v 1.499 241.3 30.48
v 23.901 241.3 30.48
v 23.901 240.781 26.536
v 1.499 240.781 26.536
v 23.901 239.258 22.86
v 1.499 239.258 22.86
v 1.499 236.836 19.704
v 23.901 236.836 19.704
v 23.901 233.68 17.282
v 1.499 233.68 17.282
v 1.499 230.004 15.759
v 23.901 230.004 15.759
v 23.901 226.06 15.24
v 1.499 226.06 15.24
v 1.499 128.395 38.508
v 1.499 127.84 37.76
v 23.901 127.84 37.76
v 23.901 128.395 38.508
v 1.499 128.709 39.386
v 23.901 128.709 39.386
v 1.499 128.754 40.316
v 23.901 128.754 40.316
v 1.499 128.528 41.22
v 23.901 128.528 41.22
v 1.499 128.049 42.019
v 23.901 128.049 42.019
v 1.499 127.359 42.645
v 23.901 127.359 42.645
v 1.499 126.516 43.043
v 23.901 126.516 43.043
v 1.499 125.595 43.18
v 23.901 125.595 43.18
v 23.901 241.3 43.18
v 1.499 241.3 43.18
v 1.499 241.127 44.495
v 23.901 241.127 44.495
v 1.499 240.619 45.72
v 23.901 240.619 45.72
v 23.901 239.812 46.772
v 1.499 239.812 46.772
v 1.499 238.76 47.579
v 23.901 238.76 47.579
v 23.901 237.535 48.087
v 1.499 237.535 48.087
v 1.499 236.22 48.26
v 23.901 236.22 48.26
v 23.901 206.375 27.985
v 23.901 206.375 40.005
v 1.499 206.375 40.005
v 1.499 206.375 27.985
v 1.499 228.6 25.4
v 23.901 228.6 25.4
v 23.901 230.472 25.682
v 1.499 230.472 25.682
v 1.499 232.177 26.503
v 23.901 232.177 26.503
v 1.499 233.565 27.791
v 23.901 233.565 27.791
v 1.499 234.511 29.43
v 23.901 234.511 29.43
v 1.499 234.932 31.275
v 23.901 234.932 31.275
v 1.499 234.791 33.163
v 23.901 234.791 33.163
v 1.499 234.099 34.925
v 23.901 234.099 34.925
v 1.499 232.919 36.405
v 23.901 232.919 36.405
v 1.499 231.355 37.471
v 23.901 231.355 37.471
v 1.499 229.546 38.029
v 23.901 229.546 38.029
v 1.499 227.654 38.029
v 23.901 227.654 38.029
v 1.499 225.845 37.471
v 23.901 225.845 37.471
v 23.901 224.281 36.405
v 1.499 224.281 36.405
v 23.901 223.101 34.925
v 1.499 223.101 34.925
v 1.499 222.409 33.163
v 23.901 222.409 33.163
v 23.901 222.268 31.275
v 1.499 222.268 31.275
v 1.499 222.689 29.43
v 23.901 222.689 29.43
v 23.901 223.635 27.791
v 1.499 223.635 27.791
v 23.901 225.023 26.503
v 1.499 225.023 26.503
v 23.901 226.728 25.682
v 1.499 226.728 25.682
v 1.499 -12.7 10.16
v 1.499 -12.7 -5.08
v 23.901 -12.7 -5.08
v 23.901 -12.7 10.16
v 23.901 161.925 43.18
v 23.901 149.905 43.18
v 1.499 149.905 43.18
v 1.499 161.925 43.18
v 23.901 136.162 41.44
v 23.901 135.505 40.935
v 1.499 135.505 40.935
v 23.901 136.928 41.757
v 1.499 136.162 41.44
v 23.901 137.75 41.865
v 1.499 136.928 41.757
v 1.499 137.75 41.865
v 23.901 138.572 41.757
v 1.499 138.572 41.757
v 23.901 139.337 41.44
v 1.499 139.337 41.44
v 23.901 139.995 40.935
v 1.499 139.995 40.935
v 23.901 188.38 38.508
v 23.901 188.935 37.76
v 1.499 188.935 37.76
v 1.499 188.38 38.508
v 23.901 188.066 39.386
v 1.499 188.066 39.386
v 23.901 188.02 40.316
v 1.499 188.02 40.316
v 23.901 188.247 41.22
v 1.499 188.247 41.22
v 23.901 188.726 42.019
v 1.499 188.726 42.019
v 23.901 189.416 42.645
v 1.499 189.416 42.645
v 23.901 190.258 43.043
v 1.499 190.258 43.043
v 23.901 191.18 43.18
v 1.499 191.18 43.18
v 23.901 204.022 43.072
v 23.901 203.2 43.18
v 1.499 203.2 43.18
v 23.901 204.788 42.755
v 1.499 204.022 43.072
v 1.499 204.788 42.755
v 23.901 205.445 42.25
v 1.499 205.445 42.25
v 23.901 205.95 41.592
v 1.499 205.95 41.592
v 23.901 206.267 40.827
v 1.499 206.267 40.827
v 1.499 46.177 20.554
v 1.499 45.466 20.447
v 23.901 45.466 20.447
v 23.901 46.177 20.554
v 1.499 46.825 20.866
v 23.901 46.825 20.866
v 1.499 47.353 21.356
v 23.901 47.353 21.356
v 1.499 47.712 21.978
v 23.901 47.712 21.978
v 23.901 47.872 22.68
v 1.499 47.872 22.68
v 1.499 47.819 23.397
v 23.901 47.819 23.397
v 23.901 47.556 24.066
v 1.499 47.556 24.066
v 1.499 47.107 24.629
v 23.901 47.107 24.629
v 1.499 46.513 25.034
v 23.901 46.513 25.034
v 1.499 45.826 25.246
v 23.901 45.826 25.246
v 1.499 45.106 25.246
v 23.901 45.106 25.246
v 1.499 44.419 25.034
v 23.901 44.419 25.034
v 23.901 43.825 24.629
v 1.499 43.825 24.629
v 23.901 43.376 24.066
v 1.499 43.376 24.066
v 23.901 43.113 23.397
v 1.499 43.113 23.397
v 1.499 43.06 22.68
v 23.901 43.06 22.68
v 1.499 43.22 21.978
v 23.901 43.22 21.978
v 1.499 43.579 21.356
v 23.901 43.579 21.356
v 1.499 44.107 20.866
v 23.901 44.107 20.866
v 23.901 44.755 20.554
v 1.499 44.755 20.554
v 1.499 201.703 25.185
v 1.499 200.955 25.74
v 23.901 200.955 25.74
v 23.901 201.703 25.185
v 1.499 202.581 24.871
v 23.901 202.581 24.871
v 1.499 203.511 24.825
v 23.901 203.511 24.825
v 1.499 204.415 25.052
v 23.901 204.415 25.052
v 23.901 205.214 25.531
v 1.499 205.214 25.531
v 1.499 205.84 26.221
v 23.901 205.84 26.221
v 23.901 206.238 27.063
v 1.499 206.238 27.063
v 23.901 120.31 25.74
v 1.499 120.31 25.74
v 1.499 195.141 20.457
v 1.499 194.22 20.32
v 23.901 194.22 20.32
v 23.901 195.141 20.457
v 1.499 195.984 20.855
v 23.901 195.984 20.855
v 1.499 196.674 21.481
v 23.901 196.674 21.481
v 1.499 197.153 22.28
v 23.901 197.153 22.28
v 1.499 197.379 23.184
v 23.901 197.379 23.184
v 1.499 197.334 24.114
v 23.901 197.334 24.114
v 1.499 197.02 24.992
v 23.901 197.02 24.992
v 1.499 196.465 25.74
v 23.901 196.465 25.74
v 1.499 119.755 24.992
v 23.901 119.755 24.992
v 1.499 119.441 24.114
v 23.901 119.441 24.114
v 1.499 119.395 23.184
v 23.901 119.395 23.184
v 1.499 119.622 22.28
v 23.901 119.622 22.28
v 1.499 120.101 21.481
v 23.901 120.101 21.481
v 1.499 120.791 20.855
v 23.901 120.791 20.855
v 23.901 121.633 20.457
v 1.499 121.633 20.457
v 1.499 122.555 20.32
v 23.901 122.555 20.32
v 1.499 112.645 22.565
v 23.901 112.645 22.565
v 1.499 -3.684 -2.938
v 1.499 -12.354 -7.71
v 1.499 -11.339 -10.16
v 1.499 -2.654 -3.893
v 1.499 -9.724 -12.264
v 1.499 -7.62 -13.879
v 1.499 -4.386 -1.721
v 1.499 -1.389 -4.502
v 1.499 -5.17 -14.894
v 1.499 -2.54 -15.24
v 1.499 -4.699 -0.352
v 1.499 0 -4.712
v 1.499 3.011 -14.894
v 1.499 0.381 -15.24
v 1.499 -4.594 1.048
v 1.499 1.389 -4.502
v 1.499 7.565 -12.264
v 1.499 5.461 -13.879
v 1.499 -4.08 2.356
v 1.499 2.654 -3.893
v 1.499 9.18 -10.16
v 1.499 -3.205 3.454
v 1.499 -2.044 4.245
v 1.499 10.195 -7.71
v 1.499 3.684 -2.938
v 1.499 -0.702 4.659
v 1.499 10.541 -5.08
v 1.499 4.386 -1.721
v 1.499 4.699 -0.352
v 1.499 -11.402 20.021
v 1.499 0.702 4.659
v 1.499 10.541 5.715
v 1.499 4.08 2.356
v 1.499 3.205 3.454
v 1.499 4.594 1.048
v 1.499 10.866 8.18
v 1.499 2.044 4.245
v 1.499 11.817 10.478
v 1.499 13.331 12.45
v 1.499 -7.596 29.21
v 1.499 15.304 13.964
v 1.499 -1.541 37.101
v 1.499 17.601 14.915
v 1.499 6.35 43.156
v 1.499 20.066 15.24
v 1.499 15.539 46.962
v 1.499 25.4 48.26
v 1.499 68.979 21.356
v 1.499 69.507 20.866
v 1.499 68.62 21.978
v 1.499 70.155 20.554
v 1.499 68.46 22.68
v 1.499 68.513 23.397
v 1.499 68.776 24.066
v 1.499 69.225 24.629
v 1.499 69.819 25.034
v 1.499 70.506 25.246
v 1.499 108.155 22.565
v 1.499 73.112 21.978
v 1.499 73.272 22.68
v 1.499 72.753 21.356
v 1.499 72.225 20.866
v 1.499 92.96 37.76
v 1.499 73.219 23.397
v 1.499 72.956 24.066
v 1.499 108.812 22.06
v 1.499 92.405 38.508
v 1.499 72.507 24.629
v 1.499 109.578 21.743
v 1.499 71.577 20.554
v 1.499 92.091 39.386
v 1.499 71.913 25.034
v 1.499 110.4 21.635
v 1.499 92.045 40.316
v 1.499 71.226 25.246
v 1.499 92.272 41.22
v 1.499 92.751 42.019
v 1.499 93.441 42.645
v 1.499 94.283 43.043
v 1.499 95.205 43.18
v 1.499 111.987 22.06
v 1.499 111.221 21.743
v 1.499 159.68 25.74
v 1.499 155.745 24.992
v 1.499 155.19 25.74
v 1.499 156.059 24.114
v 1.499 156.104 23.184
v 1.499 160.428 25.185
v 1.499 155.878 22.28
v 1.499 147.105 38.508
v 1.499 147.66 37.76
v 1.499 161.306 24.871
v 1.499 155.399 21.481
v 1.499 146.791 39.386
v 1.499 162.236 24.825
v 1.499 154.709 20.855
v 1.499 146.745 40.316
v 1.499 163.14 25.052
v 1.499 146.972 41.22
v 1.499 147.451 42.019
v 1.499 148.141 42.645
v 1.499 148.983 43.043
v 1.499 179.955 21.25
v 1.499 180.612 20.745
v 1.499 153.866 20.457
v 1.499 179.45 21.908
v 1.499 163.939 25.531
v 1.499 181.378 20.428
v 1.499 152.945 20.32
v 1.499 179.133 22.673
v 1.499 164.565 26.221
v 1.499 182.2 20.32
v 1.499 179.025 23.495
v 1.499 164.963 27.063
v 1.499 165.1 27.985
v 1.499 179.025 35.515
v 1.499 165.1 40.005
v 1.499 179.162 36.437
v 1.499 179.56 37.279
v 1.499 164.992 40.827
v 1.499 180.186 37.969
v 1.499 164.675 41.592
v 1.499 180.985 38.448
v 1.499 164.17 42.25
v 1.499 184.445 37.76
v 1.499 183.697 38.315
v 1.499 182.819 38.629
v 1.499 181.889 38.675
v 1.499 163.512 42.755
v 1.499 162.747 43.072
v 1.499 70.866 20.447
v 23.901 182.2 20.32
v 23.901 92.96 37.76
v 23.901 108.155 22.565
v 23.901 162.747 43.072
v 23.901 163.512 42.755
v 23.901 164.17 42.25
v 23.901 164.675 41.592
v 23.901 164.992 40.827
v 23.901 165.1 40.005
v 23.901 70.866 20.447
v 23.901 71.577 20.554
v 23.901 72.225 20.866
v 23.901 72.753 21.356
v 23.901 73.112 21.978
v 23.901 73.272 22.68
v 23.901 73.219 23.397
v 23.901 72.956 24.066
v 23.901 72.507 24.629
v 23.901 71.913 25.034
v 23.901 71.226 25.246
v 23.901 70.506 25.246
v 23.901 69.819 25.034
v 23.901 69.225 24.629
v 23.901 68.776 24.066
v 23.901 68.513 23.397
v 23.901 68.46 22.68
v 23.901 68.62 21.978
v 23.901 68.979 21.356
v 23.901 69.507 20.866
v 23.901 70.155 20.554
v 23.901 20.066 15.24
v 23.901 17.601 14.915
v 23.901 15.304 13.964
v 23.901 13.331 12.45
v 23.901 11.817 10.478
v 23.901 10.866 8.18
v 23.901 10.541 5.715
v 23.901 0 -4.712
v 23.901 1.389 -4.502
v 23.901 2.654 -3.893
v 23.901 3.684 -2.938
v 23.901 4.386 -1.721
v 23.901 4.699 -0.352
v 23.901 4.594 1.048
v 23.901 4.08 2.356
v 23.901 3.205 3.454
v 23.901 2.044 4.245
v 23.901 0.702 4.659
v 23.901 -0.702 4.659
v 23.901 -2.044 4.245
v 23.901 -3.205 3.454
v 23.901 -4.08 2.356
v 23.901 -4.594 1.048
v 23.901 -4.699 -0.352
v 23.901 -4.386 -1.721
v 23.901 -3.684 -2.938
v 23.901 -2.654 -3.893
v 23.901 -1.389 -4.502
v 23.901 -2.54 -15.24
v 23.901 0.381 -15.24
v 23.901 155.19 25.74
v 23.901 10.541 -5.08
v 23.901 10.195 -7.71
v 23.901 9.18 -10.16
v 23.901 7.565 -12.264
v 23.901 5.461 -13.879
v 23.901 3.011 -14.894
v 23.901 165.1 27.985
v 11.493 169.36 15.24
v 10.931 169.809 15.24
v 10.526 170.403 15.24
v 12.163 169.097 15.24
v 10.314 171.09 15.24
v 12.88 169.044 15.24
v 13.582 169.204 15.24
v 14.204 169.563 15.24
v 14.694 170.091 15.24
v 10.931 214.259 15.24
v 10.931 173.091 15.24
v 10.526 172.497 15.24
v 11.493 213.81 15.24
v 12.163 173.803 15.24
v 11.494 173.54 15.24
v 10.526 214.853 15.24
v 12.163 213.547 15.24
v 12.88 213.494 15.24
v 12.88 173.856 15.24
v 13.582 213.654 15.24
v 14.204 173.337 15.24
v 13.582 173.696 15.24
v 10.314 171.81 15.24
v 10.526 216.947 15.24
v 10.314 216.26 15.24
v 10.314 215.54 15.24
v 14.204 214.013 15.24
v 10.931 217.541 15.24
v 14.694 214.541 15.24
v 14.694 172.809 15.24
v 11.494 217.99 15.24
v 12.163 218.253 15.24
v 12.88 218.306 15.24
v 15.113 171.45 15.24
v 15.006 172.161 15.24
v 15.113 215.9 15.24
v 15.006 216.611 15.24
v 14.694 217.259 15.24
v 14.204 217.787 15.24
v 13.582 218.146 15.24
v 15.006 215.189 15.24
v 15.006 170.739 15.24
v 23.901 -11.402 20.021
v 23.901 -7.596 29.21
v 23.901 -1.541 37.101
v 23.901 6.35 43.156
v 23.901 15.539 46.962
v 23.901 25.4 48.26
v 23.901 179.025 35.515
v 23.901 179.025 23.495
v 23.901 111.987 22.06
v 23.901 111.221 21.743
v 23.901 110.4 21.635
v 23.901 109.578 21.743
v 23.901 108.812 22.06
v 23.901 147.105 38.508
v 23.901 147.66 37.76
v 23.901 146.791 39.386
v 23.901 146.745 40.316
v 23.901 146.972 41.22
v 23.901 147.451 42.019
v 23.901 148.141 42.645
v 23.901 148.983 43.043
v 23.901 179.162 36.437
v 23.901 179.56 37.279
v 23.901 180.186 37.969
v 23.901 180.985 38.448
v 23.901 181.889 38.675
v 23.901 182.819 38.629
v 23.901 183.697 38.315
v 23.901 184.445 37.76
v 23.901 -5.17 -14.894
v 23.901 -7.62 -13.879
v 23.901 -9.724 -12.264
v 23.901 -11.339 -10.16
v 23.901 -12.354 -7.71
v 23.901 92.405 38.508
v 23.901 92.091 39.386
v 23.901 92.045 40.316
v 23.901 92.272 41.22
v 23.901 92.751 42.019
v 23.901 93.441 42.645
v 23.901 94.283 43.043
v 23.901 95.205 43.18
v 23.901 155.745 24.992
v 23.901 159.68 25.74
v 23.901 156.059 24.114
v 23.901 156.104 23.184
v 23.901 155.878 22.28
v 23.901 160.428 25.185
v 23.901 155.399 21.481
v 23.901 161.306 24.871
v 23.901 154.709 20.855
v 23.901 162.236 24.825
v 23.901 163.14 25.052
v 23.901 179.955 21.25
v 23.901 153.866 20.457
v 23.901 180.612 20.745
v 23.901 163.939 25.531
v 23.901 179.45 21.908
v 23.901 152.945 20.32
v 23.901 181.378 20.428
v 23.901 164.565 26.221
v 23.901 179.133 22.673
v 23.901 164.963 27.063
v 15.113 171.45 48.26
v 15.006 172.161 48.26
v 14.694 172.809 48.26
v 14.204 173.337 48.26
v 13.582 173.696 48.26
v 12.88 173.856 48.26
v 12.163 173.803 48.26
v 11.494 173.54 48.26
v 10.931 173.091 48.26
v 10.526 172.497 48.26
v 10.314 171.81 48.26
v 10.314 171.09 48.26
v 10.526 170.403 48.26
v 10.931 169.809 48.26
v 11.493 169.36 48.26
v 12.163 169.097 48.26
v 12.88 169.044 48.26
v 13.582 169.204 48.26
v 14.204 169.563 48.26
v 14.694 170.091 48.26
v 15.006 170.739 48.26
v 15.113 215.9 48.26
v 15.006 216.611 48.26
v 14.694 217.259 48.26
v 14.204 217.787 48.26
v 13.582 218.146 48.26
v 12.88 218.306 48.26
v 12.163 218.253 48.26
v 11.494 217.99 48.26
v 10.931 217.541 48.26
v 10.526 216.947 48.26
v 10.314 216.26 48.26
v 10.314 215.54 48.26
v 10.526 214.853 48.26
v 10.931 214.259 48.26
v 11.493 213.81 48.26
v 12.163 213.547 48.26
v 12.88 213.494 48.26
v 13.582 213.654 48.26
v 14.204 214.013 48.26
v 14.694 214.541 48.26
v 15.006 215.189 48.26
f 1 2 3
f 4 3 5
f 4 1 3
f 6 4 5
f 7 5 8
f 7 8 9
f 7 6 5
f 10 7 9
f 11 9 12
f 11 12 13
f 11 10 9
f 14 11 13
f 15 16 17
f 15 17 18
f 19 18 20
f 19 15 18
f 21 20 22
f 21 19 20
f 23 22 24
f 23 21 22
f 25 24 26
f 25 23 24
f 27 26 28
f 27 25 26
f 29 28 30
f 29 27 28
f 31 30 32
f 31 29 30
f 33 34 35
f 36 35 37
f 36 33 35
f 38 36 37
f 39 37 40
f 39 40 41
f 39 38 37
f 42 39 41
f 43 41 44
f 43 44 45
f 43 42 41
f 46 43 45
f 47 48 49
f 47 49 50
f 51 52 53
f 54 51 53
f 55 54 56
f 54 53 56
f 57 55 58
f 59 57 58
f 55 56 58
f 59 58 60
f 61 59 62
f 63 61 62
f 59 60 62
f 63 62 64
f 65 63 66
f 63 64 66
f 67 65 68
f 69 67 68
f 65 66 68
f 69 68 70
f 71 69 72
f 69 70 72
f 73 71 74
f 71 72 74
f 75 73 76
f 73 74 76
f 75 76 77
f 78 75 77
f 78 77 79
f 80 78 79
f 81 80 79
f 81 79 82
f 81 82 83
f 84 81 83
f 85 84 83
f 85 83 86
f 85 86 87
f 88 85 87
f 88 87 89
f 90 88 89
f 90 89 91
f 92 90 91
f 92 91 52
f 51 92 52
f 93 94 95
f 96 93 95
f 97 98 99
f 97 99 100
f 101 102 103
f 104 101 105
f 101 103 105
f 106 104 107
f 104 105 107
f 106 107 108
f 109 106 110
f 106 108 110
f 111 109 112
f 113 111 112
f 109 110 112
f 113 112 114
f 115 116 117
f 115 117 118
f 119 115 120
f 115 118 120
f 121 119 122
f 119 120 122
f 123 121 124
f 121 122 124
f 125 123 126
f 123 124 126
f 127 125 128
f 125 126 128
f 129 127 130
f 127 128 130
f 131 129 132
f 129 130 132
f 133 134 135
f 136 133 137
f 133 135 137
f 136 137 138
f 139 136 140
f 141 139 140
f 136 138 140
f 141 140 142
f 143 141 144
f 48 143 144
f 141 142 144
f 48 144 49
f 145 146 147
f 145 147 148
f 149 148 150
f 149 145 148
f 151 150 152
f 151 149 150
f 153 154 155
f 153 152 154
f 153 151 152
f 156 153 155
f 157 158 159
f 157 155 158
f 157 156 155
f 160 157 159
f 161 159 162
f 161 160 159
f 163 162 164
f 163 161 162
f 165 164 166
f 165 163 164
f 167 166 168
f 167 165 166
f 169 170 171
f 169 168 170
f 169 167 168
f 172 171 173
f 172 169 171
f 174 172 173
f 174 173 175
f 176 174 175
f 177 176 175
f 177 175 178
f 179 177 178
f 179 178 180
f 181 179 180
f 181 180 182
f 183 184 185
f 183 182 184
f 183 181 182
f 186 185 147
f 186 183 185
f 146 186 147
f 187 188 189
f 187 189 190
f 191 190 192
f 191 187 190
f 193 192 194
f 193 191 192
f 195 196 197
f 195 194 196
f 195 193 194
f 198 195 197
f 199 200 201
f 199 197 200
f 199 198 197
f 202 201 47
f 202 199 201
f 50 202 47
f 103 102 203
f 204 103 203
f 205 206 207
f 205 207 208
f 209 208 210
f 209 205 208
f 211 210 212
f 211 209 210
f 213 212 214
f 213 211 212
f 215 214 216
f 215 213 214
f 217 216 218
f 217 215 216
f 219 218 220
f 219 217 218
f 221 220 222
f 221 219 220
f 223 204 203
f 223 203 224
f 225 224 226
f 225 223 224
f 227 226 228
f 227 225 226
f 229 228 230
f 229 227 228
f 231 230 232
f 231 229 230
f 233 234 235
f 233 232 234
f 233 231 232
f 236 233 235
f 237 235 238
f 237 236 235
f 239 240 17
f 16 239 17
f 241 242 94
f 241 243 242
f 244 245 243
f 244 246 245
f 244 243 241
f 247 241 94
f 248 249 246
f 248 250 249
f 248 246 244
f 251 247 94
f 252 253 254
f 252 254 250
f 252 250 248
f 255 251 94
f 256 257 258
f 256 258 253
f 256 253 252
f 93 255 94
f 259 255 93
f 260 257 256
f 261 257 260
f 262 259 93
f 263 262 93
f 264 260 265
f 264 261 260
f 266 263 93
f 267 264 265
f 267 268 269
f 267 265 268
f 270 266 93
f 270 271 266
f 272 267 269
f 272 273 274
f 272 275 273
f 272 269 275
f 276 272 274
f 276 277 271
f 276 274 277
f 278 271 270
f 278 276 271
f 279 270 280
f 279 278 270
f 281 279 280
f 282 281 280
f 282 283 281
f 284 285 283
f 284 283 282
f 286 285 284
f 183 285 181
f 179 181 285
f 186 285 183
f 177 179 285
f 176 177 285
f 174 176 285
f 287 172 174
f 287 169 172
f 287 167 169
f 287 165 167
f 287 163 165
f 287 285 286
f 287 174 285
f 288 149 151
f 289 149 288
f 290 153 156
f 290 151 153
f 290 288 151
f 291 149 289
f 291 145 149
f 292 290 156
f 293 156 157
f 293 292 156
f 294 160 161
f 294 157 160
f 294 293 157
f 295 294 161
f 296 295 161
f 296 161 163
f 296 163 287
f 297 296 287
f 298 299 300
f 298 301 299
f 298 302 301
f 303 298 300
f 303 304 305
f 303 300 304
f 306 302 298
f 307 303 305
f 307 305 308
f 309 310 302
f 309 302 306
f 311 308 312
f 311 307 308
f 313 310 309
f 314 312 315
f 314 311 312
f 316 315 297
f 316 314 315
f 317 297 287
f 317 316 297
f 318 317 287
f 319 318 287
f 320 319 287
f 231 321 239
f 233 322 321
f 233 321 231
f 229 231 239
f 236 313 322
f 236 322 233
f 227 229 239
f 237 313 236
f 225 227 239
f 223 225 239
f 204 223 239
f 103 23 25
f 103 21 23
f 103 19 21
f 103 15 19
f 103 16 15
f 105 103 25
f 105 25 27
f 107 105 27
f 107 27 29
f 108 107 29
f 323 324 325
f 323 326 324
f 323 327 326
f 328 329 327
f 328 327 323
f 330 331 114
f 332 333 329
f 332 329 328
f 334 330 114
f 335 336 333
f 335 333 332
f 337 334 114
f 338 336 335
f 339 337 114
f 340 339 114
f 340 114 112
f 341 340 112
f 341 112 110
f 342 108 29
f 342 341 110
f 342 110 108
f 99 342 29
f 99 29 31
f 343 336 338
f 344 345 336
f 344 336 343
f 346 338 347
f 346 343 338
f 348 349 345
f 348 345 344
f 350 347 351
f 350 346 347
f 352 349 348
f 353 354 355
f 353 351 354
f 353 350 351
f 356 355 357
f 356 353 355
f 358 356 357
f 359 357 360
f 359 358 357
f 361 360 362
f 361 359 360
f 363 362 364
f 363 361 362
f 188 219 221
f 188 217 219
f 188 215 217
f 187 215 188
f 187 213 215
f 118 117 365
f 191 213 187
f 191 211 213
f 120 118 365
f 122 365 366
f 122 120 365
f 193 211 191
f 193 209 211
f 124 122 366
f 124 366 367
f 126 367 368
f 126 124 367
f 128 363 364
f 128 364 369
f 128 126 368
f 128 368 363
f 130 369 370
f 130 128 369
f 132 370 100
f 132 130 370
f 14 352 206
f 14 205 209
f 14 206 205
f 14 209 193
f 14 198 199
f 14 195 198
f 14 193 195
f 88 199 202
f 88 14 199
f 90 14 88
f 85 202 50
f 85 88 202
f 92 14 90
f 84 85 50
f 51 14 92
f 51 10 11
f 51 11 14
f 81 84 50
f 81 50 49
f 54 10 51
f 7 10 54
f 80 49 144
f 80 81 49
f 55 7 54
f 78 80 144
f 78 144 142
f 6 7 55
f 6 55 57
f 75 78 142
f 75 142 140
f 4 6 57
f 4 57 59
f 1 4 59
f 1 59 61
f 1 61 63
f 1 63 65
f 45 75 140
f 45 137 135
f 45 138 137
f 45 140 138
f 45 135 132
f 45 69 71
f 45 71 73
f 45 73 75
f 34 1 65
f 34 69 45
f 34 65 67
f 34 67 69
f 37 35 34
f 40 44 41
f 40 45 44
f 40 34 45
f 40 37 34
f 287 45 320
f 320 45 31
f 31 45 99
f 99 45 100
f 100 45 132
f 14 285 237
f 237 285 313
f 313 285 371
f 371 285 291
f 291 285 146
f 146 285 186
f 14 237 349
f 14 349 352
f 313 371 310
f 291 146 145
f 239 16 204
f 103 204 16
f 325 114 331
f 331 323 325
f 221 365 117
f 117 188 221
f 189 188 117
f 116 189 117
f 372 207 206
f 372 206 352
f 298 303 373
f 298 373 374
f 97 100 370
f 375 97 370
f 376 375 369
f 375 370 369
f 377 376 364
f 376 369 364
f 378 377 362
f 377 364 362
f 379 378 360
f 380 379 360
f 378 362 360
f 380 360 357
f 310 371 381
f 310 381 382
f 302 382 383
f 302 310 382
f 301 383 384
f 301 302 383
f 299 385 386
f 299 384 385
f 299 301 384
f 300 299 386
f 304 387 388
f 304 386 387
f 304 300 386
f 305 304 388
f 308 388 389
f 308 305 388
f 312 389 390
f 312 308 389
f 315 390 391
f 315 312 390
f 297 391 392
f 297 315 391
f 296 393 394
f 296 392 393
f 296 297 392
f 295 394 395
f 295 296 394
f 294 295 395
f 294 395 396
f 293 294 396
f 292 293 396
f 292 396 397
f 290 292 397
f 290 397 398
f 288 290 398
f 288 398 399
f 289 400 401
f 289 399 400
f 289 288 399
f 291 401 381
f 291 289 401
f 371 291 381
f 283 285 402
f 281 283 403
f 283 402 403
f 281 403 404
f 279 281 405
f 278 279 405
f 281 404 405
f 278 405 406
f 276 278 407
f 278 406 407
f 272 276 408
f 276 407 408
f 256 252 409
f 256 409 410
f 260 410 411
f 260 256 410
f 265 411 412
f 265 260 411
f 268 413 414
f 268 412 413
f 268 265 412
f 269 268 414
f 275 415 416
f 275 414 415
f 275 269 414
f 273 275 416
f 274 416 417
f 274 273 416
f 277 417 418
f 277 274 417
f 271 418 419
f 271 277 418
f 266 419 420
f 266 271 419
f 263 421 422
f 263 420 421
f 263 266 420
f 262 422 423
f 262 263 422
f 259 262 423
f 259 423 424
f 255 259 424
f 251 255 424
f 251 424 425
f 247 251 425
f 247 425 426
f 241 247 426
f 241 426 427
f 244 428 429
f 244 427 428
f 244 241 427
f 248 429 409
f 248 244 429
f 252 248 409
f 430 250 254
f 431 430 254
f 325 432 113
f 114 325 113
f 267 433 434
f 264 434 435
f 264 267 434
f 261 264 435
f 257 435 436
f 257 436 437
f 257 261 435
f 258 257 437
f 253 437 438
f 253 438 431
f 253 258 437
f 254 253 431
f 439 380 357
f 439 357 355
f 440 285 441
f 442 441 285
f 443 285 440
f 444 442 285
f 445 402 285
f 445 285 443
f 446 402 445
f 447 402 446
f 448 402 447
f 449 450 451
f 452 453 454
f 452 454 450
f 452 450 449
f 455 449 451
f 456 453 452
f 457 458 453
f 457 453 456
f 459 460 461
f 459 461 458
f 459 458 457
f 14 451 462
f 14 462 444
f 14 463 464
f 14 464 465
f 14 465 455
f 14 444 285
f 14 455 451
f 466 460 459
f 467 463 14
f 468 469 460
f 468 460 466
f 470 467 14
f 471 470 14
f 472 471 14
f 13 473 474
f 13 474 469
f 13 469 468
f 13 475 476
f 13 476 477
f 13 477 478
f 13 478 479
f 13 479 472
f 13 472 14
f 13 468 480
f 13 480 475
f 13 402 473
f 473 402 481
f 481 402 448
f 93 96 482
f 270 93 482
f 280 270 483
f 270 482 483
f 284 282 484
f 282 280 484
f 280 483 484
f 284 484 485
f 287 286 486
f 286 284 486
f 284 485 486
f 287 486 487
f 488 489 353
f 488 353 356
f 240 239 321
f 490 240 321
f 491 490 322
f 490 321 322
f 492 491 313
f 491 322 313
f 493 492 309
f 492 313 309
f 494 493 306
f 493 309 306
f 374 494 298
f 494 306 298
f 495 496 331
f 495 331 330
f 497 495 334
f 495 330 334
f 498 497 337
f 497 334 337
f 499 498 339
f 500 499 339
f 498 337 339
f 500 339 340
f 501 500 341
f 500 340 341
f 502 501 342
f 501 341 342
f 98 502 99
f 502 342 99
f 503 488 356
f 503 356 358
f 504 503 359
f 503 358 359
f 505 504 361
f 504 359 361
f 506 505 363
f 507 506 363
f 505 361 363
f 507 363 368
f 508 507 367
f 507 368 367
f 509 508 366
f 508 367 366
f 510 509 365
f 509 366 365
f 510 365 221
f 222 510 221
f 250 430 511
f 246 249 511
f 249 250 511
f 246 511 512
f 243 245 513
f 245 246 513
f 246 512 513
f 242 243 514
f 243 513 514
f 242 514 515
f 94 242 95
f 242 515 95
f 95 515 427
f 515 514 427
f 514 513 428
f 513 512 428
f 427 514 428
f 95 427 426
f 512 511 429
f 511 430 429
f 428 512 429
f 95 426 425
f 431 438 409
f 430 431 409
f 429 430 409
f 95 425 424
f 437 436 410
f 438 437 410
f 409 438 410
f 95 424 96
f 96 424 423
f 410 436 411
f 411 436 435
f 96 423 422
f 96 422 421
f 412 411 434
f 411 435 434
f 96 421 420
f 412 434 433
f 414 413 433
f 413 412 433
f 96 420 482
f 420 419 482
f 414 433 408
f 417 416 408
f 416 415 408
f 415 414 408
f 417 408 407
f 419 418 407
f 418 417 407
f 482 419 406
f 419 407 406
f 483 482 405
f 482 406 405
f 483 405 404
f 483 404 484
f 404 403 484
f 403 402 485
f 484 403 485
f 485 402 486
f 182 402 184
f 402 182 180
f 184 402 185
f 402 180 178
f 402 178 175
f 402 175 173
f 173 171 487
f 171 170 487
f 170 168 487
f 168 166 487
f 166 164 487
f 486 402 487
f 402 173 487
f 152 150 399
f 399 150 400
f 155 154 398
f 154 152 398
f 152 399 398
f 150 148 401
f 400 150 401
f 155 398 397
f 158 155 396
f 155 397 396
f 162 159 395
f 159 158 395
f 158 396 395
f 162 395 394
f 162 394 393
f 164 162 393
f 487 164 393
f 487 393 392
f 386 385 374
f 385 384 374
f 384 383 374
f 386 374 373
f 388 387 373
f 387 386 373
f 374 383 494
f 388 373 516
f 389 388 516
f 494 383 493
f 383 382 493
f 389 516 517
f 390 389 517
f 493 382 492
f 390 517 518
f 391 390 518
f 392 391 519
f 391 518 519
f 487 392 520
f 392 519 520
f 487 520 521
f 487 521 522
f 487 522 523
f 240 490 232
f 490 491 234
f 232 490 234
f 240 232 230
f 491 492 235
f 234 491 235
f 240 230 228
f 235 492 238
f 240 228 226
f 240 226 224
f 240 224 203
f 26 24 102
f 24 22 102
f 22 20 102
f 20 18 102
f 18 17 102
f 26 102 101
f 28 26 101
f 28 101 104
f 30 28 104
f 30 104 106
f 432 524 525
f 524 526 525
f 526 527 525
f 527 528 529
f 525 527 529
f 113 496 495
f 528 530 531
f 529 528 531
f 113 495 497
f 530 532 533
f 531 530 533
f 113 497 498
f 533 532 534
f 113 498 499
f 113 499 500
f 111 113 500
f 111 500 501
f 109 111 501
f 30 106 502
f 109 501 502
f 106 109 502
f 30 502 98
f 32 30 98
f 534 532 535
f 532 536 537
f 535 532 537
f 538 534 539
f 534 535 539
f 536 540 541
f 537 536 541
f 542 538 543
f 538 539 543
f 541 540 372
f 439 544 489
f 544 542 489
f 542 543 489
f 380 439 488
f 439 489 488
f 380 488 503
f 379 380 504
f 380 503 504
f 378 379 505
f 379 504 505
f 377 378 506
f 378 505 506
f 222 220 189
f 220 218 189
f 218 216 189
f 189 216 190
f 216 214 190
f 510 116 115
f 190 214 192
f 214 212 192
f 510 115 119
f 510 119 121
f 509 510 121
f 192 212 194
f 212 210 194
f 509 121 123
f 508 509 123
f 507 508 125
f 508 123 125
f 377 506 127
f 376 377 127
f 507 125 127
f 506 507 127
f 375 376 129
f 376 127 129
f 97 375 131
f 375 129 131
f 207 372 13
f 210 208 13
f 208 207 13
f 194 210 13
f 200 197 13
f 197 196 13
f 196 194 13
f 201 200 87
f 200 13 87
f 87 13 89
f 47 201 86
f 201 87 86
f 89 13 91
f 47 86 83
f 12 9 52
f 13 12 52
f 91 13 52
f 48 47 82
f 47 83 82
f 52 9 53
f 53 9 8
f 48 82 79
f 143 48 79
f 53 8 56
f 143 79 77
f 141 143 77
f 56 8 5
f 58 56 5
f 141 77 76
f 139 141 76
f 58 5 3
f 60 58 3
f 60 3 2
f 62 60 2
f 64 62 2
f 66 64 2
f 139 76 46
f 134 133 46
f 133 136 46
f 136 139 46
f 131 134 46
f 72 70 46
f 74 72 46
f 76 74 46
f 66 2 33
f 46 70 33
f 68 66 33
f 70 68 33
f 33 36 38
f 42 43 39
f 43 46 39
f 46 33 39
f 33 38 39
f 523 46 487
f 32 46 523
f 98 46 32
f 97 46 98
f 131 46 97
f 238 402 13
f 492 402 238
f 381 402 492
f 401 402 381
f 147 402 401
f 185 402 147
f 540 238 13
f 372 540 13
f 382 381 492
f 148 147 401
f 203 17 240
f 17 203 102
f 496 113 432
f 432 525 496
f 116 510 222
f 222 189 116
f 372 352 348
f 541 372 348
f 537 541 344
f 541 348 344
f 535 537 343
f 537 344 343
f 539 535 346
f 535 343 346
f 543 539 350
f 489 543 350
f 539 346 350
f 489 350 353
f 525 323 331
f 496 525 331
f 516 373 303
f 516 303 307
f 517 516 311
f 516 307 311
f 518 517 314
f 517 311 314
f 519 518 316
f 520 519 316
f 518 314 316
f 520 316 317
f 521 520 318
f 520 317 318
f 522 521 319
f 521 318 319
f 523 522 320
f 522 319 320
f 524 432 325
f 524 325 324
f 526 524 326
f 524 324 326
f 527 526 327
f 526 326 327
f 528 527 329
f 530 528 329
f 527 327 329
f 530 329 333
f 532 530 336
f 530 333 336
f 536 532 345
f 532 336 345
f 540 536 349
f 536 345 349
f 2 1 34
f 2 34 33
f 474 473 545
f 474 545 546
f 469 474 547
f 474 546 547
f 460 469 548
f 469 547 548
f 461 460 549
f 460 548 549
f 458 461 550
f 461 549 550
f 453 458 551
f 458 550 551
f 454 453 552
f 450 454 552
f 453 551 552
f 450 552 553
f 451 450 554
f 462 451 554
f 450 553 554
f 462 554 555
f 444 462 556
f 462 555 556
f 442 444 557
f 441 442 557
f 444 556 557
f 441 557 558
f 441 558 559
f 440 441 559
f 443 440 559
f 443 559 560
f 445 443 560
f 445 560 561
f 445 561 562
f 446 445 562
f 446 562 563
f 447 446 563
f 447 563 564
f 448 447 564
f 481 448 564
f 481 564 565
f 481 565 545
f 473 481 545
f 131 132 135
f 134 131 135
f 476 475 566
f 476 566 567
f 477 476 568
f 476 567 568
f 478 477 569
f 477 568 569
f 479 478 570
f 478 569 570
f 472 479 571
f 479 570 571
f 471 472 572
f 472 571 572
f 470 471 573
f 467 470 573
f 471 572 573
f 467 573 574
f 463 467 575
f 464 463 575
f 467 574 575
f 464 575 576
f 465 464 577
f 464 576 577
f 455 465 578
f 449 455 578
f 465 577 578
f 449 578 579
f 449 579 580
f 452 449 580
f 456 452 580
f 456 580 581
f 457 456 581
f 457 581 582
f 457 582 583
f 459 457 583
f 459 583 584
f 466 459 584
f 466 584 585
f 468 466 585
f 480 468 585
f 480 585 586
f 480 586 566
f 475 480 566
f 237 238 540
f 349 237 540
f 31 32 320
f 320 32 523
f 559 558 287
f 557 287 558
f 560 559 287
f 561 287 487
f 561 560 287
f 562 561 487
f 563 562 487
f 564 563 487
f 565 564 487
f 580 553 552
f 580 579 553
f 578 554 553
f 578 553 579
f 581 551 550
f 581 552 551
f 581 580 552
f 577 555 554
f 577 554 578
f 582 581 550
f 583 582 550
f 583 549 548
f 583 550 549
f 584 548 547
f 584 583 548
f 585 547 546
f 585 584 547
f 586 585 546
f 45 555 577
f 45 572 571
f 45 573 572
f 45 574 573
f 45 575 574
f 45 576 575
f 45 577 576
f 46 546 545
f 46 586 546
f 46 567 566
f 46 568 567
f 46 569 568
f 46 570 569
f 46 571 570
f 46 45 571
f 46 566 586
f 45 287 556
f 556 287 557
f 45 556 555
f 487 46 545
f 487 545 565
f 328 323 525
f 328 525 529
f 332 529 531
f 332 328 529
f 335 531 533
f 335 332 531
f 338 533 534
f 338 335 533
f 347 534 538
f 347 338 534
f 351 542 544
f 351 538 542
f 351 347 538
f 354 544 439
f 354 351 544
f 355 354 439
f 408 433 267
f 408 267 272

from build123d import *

# Parameters (mm, degrees)
SKETCH3_W               = 50.8
SKETCH3_H               = 254
BOSS_EXTRUDE1_DEPTH     = 25.4
SKETCH4_R               = 4.7117
CUT_EXTRUDE1_DEPTH      = 246.225128402
SKETCH5_R               = 2.413
CUT_EXTRUDE2_DEPTH      = 246.225128402
SKETCH6_W               = 45.72
SKETCH6_H               = 85.725
CUT_EXTRUDE3_DEPTH      = 246.225128402
SKETCH7_W               = 15.24
SKETCH7_H               = 85.725
CUT_EXTRUDE4_DEPTH      = 1.4986
SKETCH8_W               = 15.24
SKETCH8_H               = 85.725
CUT_EXTRUDE5_DEPTH      = 1.4986
SKETCH9_W               = 30.48
SKETCH9_H               = 230.759
CUT_EXTRUDE6_DEPTH      = 246.225128402
FILLET5_R               = 6.35
SKETCH14_W              = 25.4
SKETCH14_H              = 254
BOSS_EXTRUDE2_DEPTH     = 12.7
FILLET8_R               = 38.1
FILLET9_R               = 9.525
FILLET10_R              = 10.16
FILLET11_R              = 15.24
FILLET12_R              = 5.08
SKETCH18_R              = 2.413
CUT_EXTRUDE8_DEPTH      = 251.804904258
CUT_EXTRUDE9_DEPTH      = 248.386090151
FILLET13_R              = 3.175
SKETCH20_R              = 6.35
CUT_EXTRUDE10_DEPTH     = 248.386090151
CUT_EXTRUDE11_START     = -254
CUT_EXTRUDE11_OUTLINE_W = 1.4986
CUT_EXTRUDE11_OUTLINE_H = 63.5
CUT_EXTRUDE11_DEPTH     = 254


# Read off the part's stored shape, not the designer's step: Cut-Extrude11
with BuildPart() as part:
    # Sketch3 → Boss-Extrude1 (new body)
    with BuildSketch(Plane(origin=(0, 0, 0), x_dir=(0, 0, -1), z_dir=(1, 0, 0))):
        with Locations((-10.16, 114.3)):
            Rectangle(SKETCH3_W, SKETCH3_H)
    extrude(amount=BOSS_EXTRUDE1_DEPTH)

    # Sketch4 → Cut-Extrude1 (cut, through all)
    with BuildSketch(Plane(origin=(0, 0, 0), x_dir=(0, 0, -1), z_dir=(1, 0, 0))):
        Circle(SKETCH4_R)
    extrude(amount=CUT_EXTRUDE1_DEPTH, mode=Mode.SUBTRACT)

    # Sketch5 → Cut-Extrude2 (cut, through all)
    with BuildSketch(Plane(origin=(0, 0, 0), x_dir=(0, 0, -1), z_dir=(1, 0, 0))):
        with Locations((-22.86, 70.866)):
            Circle(SKETCH5_R)
        with Locations((-22.86, 45.466)):
            Circle(SKETCH5_R)
    extrude(amount=CUT_EXTRUDE2_DEPTH, mode=Mode.SUBTRACT)

    # Sketch6 → Cut-Extrude3 (cut, through all)
    with BuildSketch(Plane(origin=(0, 0, 0), x_dir=(0, 0, -1), z_dir=(1, 0, 0))):
        with Locations((7.62, 53.4035)):
            Rectangle(SKETCH6_W, SKETCH6_H)
    extrude(amount=CUT_EXTRUDE3_DEPTH, mode=Mode.SUBTRACT)

    # Sketch7 → Cut-Extrude4 (cut)
    with BuildSketch(Plane(origin=(25.4, 0, 0), x_dir=(0, 0, -1), z_dir=(1, 0, 0))):
        with Locations((-22.86, 53.4035)):
            Rectangle(SKETCH7_W, SKETCH7_H)
    extrude(amount=-CUT_EXTRUDE4_DEPTH, mode=Mode.SUBTRACT)

    # Sketch8 → Cut-Extrude5 (cut)
    with BuildSketch(Plane.ZY):
        with Locations((22.86, 53.4035)):
            Rectangle(SKETCH8_W, SKETCH8_H)
    extrude(amount=-CUT_EXTRUDE5_DEPTH, mode=Mode.SUBTRACT)

    # Sketch9 → Cut-Extrude6 (cut, through all)
    with BuildSketch(Plane(origin=(25.4, 0, 0), x_dir=(0, 0, -1), z_dir=(1, 0, 0))):
        with Locations((0, 125.9205)):
            Rectangle(SKETCH9_W, SKETCH9_H)
    extrude(amount=-CUT_EXTRUDE6_DEPTH, mode=Mode.SUBTRACT)

    # Fillet5
    fillet5_edges = [part.edges().sort_by_distance(p)[0] for p in [
        (24.6507, 10.541, 30.48),
        (24.6507, 96.266, 30.48),
        (0.7493, 96.266, 30.48),
        (0.7493, 10.541, 30.48),
    ]]
    fillet(fillet5_edges, radius=FILLET5_R)

    # Sketch14 → Boss-Extrude2 (add)
    with BuildSketch(Plane.XY.offset(35.56)):
        with Locations((12.7, 114.3)):
            Rectangle(SKETCH14_W, SKETCH14_H)
    extrude(amount=BOSS_EXTRUDE2_DEPTH)

    # Fillet8
    fillet8_edges = [part.edges().sort_by_distance(p)[0] for p in [
        (12.7, -12.7, 48.26),
    ]]
    fillet(fillet8_edges, radius=FILLET8_R)

    # Fillet9
    fillet9_edges = [part.edges().sort_by_distance(p)[0] for p in [
        (12.7, 10.541, 15.24),
    ]]
    fillet(fillet9_edges, radius=FILLET9_R)

    # Fillet10
    fillet10_edges = [part.edges().sort_by_distance(p)[0] for p in [
        (12.7, 10.541, -15.24),
        (12.7, -12.7, -15.24),
    ]]
    fillet(fillet10_edges, radius=FILLET10_R)

    # Fillet11
    fillet11_edges = [part.edges().sort_by_distance(p)[0] for p in [
        (12.7, 241.3, 15.24),
    ]]
    fillet(fillet11_edges, radius=FILLET11_R)

    # Fillet12
    fillet12_edges = [part.edges().sort_by_distance(p)[0] for p in [
        (12.7, 241.3, 48.26),
    ]]
    fillet(fillet12_edges, radius=FILLET12_R)

    # Sketch18 → Cut-Extrude8 (cut, through all)
    with BuildSketch(Plane.XY.offset(48.26)):
        with Locations((12.7, 215.9)):
            Circle(SKETCH18_R)
        with Locations((12.7, 171.45)):
            Circle(SKETCH18_R)
    extrude(amount=-CUT_EXTRUDE8_DEPTH, mode=Mode.SUBTRACT)

    # Sketch19 → Cut-Extrude9 (cut, through all)
    with BuildSketch(Plane(origin=(25.4, 0, 0), x_dir=(0, 0, -1), z_dir=(1, 0, 0))):
        Polygon((-20.32, 110.399743879), (-43.18, 133.259743879), (-43.18, 110.399743879), (-43.18, 87.539743879), align=None)
        Polygon((-43.18, 137.749871939), (-20.32, 114.889871939), (-20.32, 160.609871939), align=None)
        Polygon((-43.18, 165.1), (-20.32, 165.1), (-43.18, 142.24), align=None)
        Polygon((-43.18, 206.375), (-20.32, 206.375), (-43.18, 183.515), align=None)
        Polygon((-43.18, 179.024871939), (-20.32, 201.884871939), (-20.32, 179.024871939), align=None)
    extrude(amount=-CUT_EXTRUDE9_DEPTH, mode=Mode.SUBTRACT)

    # Fillet13
    fillet13_edges = [part.edges().sort_by_distance(p)[0] for p in [
        (12.7, 87.539743879, 43.18),
        (12.7, 133.259743879, 43.18),
        (12.7, 110.399743879, 20.32),
        (12.7, 137.749871939, 43.18),
        (12.7, 160.609871939, 20.32),
        (12.7, 114.889871939, 20.32),
        (12.7, 142.24, 43.18),
        (12.7, 165.1, 43.18),
        (12.7, 165.1, 20.32),
        (12.7, 183.515, 43.18),
        (12.7, 206.375, 43.18),
        (12.7, 206.375, 20.32),
        (12.7, 179.024871939, 20.32),
        (12.7, 179.024871939, 43.18),
        (12.7, 201.884871939, 20.32),
    ]]
    fillet(fillet13_edges, radius=FILLET13_R)

    # Sketch20 → Cut-Extrude10 (cut, through all)
    with BuildSketch(Plane(origin=(25.4, 0, 0), x_dir=(0, 0, -1), z_dir=(1, 0, 0))):
        with Locations((-31.75, 228.6)):
            Circle(SKETCH20_R)
    extrude(amount=-CUT_EXTRUDE10_DEPTH, mode=Mode.SUBTRACT)

    # Cut-Extrude11 outline → Cut-Extrude11 (cut)
    with BuildSketch(Plane.XZ.offset(12.7).offset(CUT_EXTRUDE11_START)):
        with Locations((24.6507, 16.51)):
            Rectangle(CUT_EXTRUDE11_OUTLINE_W, CUT_EXTRUDE11_OUTLINE_H)
        with Locations((0.7493, 16.51)):
            Rectangle(CUT_EXTRUDE11_OUTLINE_W, CUT_EXTRUDE11_OUTLINE_H)
    extrude(amount=CUT_EXTRUDE11_DEPTH, mode=Mode.SUBTRACT)


solid = part.part
